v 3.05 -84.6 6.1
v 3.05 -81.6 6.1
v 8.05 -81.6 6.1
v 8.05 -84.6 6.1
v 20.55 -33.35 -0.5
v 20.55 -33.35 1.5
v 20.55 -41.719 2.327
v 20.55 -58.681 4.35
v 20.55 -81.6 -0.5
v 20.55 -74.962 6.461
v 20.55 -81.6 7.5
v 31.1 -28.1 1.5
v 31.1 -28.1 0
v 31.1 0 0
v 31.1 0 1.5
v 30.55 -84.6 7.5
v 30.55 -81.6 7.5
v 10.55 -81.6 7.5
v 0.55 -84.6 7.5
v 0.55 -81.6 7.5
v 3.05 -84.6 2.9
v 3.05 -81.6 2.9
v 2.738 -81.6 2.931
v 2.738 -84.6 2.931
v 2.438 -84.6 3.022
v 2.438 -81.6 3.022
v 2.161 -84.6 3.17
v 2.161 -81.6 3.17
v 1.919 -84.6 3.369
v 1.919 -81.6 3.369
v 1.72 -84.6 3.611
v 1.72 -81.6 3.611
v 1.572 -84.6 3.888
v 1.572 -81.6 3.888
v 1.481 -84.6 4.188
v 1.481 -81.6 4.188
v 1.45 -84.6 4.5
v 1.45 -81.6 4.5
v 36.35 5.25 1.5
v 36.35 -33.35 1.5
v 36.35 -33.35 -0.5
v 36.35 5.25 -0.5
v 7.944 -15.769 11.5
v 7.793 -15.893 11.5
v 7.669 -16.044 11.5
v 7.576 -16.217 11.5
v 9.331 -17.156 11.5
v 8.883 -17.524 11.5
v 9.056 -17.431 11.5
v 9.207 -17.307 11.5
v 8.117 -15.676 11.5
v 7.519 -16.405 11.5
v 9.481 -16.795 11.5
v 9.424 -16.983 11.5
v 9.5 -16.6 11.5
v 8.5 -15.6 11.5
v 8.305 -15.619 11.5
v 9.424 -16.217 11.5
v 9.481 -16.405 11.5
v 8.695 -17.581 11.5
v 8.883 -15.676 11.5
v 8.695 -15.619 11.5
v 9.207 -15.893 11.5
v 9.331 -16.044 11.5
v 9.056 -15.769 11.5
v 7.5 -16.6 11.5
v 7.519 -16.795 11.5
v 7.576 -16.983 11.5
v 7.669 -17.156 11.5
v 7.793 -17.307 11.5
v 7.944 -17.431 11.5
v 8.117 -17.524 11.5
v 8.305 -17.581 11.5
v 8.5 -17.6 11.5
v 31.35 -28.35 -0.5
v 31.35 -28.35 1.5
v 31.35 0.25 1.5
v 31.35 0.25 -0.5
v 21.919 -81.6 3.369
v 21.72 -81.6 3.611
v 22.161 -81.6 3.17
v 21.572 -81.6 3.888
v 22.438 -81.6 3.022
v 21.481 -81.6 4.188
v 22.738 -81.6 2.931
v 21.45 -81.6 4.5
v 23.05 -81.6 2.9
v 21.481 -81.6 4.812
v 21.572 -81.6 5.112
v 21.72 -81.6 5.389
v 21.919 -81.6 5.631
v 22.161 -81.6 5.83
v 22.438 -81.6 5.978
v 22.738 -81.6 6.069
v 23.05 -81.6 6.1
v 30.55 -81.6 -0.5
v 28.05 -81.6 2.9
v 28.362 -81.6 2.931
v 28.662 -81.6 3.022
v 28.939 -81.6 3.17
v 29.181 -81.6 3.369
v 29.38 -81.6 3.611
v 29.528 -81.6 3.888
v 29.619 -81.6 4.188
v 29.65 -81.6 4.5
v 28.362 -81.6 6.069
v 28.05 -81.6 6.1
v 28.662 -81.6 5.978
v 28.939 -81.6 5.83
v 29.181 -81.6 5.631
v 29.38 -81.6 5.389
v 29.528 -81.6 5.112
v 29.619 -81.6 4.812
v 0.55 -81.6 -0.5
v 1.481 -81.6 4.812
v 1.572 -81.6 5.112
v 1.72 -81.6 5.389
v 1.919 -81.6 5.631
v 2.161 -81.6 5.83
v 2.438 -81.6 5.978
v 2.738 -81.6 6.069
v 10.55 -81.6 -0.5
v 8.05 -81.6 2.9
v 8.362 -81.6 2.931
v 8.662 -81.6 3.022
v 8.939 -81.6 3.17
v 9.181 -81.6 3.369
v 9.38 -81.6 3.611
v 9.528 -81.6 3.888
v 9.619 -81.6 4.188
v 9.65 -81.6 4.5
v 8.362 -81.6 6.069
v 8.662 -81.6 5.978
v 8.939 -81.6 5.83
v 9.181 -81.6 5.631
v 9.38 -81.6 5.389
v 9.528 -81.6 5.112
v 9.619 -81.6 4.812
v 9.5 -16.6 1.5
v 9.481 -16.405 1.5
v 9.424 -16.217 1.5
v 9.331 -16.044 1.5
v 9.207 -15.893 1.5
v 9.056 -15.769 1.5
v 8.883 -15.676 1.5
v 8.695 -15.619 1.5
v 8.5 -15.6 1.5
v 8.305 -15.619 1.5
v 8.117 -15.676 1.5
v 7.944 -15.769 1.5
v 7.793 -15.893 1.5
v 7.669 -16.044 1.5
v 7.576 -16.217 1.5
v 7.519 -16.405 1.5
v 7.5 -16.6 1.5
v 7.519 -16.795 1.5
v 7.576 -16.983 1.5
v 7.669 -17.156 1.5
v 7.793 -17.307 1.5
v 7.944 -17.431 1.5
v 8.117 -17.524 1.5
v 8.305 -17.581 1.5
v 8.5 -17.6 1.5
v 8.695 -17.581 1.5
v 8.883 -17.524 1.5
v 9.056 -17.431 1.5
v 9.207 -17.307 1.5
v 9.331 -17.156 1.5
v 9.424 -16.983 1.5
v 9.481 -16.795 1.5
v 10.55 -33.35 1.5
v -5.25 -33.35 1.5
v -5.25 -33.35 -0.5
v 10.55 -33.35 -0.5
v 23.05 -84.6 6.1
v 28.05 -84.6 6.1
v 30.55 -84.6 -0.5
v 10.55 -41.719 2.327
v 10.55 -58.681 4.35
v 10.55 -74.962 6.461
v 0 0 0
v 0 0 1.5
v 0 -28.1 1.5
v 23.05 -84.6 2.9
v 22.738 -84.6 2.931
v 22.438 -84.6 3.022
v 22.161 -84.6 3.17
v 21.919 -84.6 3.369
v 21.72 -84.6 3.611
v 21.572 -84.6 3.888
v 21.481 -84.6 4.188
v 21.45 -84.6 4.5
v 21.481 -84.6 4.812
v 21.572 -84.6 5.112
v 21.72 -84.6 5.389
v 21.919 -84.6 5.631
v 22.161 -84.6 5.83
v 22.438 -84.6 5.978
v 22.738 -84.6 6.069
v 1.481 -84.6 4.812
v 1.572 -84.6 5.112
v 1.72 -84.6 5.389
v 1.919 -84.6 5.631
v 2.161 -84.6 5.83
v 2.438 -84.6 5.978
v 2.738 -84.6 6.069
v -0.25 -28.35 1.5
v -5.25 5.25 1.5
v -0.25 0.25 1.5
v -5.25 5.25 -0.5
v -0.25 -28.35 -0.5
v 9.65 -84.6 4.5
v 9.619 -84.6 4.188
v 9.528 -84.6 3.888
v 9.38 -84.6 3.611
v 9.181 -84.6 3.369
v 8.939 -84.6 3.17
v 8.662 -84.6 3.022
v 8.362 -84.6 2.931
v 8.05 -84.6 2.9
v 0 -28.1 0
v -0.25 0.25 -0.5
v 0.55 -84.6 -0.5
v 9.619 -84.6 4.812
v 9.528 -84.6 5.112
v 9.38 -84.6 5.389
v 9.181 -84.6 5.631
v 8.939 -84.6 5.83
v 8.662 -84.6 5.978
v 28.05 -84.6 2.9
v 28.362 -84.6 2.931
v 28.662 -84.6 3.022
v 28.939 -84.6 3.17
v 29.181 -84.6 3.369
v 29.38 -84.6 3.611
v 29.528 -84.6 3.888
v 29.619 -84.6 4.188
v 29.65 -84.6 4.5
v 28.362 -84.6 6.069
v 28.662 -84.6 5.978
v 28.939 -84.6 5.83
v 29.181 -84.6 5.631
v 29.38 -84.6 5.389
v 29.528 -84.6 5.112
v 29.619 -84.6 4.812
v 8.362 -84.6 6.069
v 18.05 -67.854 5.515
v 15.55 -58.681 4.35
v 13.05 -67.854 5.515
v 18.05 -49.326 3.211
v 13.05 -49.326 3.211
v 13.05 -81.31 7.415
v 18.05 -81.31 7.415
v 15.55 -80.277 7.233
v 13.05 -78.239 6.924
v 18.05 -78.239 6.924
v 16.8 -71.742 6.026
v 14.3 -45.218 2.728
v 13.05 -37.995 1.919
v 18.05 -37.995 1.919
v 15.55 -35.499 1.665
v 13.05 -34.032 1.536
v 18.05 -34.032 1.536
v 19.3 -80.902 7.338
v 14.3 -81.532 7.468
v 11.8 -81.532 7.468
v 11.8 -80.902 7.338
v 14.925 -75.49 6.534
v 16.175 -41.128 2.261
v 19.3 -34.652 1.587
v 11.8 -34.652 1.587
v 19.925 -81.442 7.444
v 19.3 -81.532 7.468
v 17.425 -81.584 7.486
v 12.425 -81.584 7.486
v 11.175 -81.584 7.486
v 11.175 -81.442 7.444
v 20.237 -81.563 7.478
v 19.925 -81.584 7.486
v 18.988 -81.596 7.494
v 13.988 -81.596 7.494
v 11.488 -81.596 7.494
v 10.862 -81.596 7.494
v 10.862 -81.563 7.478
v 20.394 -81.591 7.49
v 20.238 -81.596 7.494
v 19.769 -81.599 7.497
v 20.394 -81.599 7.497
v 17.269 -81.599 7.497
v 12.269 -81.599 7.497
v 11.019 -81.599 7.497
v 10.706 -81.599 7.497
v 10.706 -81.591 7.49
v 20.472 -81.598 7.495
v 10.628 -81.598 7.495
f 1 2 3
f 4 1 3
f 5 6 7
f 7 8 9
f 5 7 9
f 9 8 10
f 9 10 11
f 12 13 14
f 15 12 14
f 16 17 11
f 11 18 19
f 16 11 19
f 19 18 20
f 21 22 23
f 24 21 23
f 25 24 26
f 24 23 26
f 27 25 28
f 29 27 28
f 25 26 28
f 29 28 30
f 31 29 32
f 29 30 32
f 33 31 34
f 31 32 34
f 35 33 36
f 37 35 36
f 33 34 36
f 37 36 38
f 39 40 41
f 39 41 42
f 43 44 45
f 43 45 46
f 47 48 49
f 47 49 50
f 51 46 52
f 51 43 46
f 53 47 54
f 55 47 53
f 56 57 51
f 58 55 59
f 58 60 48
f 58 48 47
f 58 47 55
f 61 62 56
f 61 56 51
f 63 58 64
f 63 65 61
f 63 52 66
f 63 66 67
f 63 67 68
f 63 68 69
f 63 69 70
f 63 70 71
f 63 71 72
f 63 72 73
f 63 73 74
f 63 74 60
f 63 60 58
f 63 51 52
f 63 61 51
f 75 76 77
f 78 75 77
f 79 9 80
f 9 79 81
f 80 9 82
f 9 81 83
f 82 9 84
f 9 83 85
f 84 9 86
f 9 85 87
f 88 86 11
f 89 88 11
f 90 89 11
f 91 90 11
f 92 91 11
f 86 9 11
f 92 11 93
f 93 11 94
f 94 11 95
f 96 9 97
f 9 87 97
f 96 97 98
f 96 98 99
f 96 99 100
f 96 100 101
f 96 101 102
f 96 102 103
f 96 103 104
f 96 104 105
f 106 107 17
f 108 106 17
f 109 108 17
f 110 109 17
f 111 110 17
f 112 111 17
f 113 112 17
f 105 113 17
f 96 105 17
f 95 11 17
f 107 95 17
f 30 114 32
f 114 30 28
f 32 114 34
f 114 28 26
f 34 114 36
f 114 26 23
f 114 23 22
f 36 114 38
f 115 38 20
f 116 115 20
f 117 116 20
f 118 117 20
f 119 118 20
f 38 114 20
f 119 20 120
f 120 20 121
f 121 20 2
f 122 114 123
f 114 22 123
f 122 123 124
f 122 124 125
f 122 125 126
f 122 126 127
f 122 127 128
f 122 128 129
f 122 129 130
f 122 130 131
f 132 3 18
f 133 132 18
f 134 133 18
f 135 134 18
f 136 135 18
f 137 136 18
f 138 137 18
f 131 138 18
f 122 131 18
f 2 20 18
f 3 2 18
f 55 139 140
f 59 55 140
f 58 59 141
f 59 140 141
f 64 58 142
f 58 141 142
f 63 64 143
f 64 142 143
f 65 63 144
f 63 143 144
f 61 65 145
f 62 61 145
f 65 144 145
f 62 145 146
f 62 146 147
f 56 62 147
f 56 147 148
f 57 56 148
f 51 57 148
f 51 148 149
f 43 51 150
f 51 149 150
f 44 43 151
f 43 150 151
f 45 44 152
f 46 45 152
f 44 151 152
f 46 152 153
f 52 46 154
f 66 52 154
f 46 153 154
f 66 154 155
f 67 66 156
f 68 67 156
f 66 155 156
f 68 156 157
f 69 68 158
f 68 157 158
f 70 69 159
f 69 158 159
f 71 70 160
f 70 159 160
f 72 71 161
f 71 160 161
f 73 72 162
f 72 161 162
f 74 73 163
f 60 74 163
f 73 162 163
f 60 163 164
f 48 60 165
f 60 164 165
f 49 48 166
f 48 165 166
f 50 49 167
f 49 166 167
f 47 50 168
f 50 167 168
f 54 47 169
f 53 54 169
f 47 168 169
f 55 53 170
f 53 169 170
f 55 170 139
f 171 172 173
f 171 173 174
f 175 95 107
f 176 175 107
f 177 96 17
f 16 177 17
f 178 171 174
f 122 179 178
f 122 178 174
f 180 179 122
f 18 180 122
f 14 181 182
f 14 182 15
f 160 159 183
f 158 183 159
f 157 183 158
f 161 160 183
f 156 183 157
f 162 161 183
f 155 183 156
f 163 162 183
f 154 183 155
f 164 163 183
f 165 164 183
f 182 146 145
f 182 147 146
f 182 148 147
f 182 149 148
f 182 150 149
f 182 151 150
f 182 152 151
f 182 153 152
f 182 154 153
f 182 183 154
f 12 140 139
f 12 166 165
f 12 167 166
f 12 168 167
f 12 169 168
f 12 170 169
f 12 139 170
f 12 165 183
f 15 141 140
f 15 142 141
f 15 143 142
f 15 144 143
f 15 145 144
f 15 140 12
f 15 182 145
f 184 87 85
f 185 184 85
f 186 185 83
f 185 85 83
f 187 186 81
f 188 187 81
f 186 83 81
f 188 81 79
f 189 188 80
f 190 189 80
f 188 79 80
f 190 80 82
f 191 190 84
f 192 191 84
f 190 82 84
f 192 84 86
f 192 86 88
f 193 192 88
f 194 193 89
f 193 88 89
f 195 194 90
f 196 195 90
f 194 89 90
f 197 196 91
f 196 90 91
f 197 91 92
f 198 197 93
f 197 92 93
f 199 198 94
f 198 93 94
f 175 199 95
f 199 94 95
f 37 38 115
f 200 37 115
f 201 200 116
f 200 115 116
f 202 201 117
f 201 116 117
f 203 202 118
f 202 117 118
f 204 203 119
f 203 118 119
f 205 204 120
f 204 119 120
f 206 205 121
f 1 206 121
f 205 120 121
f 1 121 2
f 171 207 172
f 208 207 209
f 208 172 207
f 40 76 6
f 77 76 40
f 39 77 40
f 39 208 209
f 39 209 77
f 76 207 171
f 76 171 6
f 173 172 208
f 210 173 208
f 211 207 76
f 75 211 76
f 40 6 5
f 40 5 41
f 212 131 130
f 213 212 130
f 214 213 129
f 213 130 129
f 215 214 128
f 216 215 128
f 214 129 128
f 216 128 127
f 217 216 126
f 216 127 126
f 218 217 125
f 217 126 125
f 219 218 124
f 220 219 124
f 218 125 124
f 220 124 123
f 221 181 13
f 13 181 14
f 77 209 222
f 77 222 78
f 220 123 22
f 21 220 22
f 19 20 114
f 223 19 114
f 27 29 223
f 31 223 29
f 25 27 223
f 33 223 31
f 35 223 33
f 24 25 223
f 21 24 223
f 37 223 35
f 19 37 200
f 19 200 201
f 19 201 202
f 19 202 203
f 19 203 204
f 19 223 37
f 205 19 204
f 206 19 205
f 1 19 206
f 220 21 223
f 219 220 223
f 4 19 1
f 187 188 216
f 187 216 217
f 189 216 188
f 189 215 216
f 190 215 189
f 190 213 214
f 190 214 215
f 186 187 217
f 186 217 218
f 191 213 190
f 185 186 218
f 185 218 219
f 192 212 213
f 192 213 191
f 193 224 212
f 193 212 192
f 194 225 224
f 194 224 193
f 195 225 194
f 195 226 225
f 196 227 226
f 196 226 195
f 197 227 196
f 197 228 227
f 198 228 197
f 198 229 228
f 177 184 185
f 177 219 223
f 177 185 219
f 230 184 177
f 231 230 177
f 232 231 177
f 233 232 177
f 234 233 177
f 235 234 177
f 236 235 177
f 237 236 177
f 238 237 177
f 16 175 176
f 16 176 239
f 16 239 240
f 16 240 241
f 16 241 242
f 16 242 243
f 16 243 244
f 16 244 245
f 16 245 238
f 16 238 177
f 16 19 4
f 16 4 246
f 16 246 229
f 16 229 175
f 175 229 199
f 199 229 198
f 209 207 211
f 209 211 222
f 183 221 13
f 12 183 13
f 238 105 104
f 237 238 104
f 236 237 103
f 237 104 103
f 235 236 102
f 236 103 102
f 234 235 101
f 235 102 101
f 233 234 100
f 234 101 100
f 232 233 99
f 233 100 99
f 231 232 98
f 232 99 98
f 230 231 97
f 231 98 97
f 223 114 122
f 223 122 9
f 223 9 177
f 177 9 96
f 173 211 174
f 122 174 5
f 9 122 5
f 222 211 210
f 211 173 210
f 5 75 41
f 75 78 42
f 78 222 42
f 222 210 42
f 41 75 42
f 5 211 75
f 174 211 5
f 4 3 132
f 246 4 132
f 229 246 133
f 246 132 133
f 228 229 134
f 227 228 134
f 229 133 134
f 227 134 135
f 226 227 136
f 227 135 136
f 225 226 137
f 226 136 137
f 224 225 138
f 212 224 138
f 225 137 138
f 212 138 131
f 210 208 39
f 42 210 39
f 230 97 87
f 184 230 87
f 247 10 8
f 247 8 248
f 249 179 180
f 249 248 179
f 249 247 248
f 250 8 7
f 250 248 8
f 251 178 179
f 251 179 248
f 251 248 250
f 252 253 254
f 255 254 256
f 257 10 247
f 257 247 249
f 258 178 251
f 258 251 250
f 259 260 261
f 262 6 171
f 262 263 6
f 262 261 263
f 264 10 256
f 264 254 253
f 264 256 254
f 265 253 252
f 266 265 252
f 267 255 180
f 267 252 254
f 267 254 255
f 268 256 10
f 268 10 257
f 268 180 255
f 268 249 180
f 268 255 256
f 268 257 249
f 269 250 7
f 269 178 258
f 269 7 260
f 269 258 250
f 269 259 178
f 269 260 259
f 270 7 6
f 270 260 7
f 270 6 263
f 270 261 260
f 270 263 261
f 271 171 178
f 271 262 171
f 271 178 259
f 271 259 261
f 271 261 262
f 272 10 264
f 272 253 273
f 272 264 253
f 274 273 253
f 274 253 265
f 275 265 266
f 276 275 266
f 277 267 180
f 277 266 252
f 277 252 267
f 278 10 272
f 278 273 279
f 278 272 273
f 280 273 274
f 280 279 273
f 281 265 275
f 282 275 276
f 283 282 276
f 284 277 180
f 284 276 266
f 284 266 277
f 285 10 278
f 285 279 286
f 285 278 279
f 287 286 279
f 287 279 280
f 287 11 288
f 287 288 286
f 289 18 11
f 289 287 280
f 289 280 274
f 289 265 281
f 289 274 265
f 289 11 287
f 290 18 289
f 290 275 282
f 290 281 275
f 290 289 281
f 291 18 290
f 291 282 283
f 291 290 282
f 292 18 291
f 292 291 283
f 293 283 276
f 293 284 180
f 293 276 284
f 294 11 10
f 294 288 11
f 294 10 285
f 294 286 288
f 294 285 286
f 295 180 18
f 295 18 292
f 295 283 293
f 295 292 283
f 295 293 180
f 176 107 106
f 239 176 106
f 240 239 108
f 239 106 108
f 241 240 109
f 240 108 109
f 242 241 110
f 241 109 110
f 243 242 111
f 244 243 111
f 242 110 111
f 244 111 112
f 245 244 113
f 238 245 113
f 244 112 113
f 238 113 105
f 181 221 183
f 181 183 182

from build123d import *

# Parameters (mm, degrees)
SKETCH1_W            = 31.1
SKETCH1_H            = 28.1
BOSS_EXTRUDE2_DEPTH  = 1.5
SKETCH3_R            = 1
BOSS_EXTRUDE3_DEPTH  = 10
SKETCH4_W            = 41.6
SKETCH4_H            = 38.6
SKETCH4_W_2          = 31.6
SKETCH4_H_2          = 28.6
BOSS_EXTRUDE4_DEPTH  = 2
SKETCH6_W            = 10
SKETCH6_H            = 2
BOSS_EXTRUDE5_DEPTH  = 48.25
SKETCH7_W            = 10
SKETCH7_H            = 3
SKETCH7_H_2          = 2
BOSS_EXTRUDE10_DEPTH = 3
FILLET5_START        = 10.55
FILLET5_DEPTH        = 10


with BuildPart() as part:
    # Sketch1 → Boss-Extrude2 (new body)
    with BuildSketch(Plane.XY):
        with Locations((15.55, -14.05)):
            Rectangle(SKETCH1_W, SKETCH1_H)
    extrude(amount=BOSS_EXTRUDE2_DEPTH)

    # Sketch3 → Boss-Extrude3 (add)
    with BuildSketch(Plane.XY.offset(1.5)):
        with Locations((8.5, -16.6)):
            Circle(SKETCH3_R)
    extrude(amount=BOSS_EXTRUDE3_DEPTH)


with BuildPart() as body_2:
    # Sketch4 → Boss-Extrude4 (new body)
    with BuildSketch(Plane.XY.offset(1.5)):
        with Locations((15.55, -14.05)):
            Rectangle(SKETCH4_W, SKETCH4_H)
        with Locations((15.55, -14.05)):
            Rectangle(SKETCH4_W_2, SKETCH4_H_2, mode=Mode.SUBTRACT)
    extrude(amount=-BOSS_EXTRUDE4_DEPTH)

    # Sketch6 → Boss-Extrude5 (add)
    with BuildSketch(Plane.XZ.offset(33.35)):
        with Locations((15.55, 0.5)):
            Rectangle(SKETCH6_W, SKETCH6_H)
    extrude(amount=BOSS_EXTRUDE5_DEPTH)

    # Sketch7 → Boss-Extrude10 (add)
    with BuildSketch(Plane.XZ.offset(81.6)):
        with BuildLine():
            Line((9.65, 4.5), (10.55, 4.5))
            Line((10.55, 4.5), (10.55, 7.5))
            Line((10.55, 7.5), (0.55, 7.5))
            Line((0.55, 7.5), (0.55, 4.5))
            Line((0.55, 4.5), (1.45, 4.5))
            ThreePointArc((1.45, 4.5), (1.91862917, 5.63137087), (3.050000057, 6.1))
            Line((3.050000057, 6.1), (8.05, 6.1))
            ThreePointArc((8.05, 6.1), (9.18137085, 5.63137085), (9.65, 4.5))
        make_face()
        with BuildLine():
            Line((0.55, 1.5), (10.55, 1.5))
            Line((10.55, 1.5), (10.55, 4.5))
            Line((10.55, 4.5), (9.65, 4.5))
            ThreePointArc((9.65, 4.5), (9.18137085, 3.36862915), (8.05, 2.9))
            Line((8.05, 2.9), (3.05, 2.9))
            ThreePointArc((3.05, 2.9), (1.91862915, 3.36862915), (1.45, 4.5))
            Line((1.45, 4.5), (0.55, 4.5))
            Line((0.55, 4.5), (0.55, 1.5))
        make_face()
        with Locations((15.55, 6)):
            Rectangle(SKETCH7_W, SKETCH7_H)
        with Locations((15.55, 3)):
            Rectangle(SKETCH7_W, SKETCH7_H)
        with BuildLine():
            Line((20.55, 4.5), (20.55, 1.5))
            Line((20.55, 1.5), (30.55, 1.5))
            Line((30.55, 1.5), (30.55, 4.5))
            Line((30.55, 4.5), (29.65, 4.5))
            ThreePointArc((29.65, 4.5), (29.18137085, 3.36862915), (28.05, 2.9))
            Line((28.05, 2.9), (23.05, 2.9))
            ThreePointArc((23.05, 2.9), (21.91862915, 3.36862915), (21.45, 4.5))
            Line((21.45, 4.5), (20.55, 4.5))
        make_face()
        with BuildLine():
            Line((20.55, 7.5), (20.55, 4.5))
            Line((20.55, 4.5), (21.45, 4.5))
            ThreePointArc((21.45, 4.5), (21.91862915, 5.63137085), (23.05, 6.1))
            Line((23.05, 6.1), (28.05, 6.1))
            ThreePointArc((28.05, 6.1), (29.18137085, 5.63137085), (29.65, 4.5))
            Line((29.65, 4.5), (30.55, 4.5))
            Line((30.55, 4.5), (30.55, 7.5))
            Line((30.55, 7.5), (20.55, 7.5))
        make_face()
        with Locations((25.55, 0.5)):
            Rectangle(SKETCH7_W, SKETCH7_H_2)
        with Locations((15.55, 0.5)):
            Rectangle(SKETCH7_W, SKETCH7_H_2)
        with Locations((5.55, 0.5)):
            Rectangle(SKETCH7_W, SKETCH7_H_2)
    extrude(amount=BOSS_EXTRUDE10_DEPTH)

    # Fillet5: read off the stored shape, not the designer's step
    # Fillet5 outline → Fillet5 (add)
    with BuildSketch(Plane.YZ.offset(FILLET5_START)):
        with BuildLine():
            add(Edge.make_bspline(
                [(-81.6, 7.5), (-81.6, 1.5), (-33.35, 1.5)],
                knots=[0, 0, 0, 1, 1, 1], degree=2, weights=[1, 0.052631579, 1]))
            Line((-81.6, 7.5), (-81.6, 1.5))
            Line((-81.6, 1.5), (-33.35, 1.5))
        make_face()
    extrude(amount=FILLET5_DEPTH)


solid = Compound([part.part, body_2.part])
